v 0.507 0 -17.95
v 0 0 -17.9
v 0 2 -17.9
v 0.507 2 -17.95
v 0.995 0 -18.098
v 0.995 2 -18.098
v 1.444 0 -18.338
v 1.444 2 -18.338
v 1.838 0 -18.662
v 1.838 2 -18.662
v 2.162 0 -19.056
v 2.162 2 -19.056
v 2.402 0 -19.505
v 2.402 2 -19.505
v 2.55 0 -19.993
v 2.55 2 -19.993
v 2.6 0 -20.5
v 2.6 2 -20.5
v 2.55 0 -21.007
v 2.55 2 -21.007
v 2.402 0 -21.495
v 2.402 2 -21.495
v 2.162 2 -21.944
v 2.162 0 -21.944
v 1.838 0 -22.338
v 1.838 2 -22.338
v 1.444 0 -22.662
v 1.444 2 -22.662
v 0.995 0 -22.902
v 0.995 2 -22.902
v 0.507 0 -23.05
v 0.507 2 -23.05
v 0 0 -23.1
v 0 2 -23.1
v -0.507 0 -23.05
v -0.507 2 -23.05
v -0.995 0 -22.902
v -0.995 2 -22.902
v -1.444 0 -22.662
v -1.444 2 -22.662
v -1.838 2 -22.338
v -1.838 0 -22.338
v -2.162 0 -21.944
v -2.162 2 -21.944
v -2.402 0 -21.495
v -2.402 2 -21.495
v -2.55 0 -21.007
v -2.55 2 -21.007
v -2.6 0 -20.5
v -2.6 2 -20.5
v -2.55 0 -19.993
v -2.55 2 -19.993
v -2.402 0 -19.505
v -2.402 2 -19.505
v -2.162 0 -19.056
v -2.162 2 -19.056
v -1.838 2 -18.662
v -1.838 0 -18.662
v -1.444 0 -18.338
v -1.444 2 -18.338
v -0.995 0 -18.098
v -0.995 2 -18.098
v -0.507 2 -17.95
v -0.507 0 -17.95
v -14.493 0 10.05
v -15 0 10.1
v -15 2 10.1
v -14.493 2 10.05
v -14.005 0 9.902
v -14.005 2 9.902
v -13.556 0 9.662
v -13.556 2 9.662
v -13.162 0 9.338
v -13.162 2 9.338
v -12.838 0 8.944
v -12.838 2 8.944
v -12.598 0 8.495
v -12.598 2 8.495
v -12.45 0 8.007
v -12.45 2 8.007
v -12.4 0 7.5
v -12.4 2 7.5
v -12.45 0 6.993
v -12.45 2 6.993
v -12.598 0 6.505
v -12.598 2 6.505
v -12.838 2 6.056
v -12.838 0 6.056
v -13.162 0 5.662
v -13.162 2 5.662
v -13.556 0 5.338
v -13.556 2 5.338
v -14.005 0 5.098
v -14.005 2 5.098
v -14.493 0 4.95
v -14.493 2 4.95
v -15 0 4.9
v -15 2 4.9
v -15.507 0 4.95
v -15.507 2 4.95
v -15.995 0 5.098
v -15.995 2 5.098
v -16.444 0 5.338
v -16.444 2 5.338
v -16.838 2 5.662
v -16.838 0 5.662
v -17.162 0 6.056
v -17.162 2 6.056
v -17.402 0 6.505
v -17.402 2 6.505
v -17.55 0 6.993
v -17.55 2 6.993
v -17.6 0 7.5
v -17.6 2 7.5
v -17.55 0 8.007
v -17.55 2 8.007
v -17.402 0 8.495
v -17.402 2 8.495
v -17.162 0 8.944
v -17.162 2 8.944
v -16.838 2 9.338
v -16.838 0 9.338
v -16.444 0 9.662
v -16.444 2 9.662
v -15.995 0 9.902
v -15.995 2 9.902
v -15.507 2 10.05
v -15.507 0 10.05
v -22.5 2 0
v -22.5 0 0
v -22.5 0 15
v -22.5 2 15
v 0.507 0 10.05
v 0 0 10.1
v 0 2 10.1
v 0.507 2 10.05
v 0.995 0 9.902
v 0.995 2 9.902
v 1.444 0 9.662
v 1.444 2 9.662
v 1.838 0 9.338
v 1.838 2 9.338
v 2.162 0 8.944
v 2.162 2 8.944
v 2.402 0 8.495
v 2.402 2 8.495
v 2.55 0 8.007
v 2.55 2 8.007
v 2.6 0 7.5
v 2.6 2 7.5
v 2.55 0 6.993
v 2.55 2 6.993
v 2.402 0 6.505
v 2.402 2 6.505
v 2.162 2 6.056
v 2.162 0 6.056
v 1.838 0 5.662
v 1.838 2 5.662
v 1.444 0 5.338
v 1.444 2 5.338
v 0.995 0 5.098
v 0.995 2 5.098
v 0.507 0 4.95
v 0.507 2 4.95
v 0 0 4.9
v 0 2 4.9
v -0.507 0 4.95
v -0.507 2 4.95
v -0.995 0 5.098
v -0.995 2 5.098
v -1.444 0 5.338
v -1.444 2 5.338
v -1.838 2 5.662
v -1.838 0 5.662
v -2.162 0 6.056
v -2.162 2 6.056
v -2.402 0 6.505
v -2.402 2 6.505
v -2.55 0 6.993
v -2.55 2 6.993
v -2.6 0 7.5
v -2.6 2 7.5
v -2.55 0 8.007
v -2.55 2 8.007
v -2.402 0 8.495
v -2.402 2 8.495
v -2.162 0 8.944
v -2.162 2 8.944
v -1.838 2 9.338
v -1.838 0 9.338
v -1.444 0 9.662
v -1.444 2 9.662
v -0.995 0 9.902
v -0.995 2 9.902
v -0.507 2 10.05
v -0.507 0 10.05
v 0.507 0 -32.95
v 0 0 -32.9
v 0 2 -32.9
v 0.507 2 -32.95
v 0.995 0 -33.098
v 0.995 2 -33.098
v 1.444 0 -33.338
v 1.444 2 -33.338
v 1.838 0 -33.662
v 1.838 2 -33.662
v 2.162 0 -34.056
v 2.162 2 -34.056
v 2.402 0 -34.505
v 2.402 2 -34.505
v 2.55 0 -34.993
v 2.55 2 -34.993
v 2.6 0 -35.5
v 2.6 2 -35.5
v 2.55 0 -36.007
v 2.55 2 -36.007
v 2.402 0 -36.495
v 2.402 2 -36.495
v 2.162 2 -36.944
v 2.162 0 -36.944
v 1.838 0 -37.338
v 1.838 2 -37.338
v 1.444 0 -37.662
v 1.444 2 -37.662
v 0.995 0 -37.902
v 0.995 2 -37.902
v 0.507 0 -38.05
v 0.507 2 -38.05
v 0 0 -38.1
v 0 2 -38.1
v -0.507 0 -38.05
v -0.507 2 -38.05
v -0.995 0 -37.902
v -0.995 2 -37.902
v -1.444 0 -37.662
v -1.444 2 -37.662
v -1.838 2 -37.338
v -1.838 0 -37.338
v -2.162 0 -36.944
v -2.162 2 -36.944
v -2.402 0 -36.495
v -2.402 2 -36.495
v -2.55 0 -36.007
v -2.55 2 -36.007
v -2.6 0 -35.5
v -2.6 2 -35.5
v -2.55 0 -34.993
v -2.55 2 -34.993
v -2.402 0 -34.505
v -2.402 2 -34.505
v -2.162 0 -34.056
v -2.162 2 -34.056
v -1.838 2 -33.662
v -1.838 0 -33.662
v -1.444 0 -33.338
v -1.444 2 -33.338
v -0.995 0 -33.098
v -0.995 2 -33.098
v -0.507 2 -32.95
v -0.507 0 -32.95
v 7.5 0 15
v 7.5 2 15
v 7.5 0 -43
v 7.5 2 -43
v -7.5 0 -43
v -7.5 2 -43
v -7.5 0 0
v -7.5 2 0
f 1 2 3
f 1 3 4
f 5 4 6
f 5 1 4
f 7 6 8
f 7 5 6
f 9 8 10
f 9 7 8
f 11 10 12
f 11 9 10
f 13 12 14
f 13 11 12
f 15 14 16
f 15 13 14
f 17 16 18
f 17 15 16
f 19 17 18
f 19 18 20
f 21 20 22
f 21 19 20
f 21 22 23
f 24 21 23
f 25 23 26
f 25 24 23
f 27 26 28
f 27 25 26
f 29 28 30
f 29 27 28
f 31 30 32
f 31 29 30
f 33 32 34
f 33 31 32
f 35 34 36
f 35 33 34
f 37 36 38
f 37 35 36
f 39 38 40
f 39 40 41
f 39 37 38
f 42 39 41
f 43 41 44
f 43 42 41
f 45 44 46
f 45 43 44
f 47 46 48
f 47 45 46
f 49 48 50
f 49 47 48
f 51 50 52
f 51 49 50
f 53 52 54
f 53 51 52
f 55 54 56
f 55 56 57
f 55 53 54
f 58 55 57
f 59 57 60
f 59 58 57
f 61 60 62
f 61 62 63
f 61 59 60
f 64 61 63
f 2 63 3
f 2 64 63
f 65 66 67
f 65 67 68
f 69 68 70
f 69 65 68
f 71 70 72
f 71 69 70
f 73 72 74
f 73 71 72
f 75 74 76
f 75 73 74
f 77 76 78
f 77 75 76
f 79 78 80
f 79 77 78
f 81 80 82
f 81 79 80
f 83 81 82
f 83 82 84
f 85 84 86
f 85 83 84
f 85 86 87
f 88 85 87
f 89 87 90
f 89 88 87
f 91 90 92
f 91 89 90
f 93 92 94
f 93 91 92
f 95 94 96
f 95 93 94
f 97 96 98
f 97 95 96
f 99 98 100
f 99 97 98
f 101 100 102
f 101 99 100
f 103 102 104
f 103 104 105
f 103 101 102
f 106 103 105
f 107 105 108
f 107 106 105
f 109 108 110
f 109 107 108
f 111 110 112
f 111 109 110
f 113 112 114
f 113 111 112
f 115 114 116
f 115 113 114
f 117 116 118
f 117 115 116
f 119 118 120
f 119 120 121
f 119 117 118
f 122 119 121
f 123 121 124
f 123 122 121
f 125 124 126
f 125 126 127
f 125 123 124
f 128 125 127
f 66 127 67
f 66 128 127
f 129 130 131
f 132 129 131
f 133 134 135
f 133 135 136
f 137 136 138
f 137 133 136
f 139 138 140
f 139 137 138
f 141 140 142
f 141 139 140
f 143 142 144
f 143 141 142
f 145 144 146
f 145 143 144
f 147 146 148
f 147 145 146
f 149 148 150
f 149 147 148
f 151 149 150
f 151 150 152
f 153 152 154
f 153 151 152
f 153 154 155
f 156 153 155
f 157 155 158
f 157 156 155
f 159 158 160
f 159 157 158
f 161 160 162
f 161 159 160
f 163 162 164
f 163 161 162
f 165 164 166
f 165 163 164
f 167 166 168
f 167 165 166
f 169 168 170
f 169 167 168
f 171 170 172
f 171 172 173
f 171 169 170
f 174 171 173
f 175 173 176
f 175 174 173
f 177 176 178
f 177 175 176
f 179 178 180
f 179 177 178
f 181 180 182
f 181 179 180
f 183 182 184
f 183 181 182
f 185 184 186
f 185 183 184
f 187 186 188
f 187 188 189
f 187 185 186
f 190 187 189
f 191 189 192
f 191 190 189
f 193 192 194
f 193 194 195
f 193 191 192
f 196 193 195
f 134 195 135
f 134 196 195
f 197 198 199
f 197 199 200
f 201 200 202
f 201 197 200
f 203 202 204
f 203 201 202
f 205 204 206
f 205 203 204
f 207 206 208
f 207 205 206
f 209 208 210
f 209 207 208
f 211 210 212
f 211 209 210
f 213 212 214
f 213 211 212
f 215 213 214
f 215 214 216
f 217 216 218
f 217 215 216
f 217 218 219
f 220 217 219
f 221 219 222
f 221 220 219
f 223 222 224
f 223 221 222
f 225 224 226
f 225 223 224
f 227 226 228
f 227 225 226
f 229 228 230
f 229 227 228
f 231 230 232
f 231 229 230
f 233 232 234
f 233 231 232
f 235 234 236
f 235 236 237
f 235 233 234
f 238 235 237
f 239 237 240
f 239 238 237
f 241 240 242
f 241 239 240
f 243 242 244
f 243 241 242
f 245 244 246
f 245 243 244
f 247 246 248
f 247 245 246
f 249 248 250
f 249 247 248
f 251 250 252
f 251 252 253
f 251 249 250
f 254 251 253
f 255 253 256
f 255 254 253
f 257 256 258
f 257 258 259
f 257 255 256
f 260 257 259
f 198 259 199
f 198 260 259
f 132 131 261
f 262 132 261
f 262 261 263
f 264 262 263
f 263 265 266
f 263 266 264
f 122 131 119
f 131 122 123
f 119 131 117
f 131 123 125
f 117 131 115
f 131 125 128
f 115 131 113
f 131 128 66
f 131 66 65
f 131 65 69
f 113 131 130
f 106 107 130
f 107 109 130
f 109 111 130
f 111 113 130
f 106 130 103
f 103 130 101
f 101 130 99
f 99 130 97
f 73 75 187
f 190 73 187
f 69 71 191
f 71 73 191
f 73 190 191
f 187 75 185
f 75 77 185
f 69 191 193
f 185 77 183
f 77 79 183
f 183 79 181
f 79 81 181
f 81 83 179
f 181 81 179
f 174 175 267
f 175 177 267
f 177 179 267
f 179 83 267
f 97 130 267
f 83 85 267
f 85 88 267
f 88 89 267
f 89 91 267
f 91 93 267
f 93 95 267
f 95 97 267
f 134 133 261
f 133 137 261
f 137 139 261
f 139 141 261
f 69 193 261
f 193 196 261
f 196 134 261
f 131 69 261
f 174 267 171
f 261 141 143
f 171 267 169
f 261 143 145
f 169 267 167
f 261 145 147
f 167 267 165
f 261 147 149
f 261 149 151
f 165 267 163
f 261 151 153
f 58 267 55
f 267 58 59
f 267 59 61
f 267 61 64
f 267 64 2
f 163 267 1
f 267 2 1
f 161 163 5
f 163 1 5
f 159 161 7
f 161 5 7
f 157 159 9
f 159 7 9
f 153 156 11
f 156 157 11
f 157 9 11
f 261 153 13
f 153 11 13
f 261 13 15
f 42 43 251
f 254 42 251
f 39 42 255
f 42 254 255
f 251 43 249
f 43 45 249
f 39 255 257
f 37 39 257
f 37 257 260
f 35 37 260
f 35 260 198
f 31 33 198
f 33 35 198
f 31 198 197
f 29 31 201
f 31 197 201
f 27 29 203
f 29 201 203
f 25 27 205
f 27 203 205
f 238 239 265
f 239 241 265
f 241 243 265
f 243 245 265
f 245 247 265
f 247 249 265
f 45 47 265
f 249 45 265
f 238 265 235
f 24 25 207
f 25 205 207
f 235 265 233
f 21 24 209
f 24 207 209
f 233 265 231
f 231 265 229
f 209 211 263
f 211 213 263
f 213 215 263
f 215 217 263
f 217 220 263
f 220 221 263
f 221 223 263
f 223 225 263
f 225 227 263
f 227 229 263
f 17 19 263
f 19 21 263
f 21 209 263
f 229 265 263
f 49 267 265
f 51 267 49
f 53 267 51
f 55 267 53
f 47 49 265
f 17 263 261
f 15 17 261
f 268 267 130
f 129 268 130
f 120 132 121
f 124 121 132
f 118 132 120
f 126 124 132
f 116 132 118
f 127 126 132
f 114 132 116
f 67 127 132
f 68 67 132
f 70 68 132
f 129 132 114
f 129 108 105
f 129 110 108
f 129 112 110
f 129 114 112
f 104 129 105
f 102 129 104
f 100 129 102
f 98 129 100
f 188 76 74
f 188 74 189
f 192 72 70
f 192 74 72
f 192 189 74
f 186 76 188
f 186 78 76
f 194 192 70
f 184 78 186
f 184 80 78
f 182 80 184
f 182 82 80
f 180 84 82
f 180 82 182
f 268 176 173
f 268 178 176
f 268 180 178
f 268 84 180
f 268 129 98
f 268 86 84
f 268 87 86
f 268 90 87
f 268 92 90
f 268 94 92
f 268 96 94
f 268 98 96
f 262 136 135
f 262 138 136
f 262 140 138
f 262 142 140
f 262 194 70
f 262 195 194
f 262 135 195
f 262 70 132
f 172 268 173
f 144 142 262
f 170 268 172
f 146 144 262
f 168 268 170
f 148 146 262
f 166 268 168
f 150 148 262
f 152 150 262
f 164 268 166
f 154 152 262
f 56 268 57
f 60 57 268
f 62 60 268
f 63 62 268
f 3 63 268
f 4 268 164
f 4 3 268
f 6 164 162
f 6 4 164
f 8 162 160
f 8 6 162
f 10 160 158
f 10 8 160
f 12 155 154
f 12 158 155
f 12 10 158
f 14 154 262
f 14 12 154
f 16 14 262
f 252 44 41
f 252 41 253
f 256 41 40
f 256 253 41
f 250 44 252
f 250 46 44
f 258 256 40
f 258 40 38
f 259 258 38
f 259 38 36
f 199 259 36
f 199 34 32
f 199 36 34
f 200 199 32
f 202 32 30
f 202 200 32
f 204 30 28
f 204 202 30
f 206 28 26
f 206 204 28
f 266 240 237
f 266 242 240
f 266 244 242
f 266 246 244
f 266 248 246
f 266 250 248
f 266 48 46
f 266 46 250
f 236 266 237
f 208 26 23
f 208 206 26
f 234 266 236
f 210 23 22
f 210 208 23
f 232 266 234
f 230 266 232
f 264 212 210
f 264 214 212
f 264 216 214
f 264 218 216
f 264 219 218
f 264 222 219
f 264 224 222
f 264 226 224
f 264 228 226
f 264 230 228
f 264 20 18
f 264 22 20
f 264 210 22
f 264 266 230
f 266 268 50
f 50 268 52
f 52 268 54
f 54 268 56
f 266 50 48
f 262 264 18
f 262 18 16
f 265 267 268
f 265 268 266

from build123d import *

# Parameters (mm, degrees)
SKETCH_1_R      = 2.6
SKETCH_1_W      = 15
SKETCH_1_H      = 15
EXTRUDE_1_DEPTH = 2


with BuildPart() as part:
    # 草图1 → 凸台-拉伸1 (new body)
    # profile 1 of 2: a face of its own
    with BuildSketch(Plane(origin=(0, 0, 0), x_dir=(1, 0, 0), z_dir=(0, 1, 0))):
        Polygon((7.5, -15), (7.5, 0), (7.5, 13), (7.5, 28), (-7.5, 28), (-7.5, 13), (-7.5, 0), (-22.5, 0), (-22.5, -15), align=None)
        with Locations(Location((-15, -7.5, 0), (0, 0, 270))):
            Circle(SKETCH_1_R, mode=Mode.SUBTRACT)
        with Locations(Location((0, -7.5, 0), (0, 0, 270))):
            Circle(SKETCH_1_R, mode=Mode.SUBTRACT)
        with Locations(Location((0, 20.5, 0), (0, 0, 270))):
            Circle(SKETCH_1_R, mode=Mode.SUBTRACT)
    # profile 2 of 2: a face of its own
    with BuildSketch(Plane(origin=(0, 0, 0), x_dir=(1, 0, 0), z_dir=(0, 1, 0))):
        with Locations((0, 35.5)):
            Rectangle(SKETCH_1_W, SKETCH_1_H)
        with Locations(Location((0, 35.5, 0), (0, 0, 270))):
            Circle(SKETCH_1_R, mode=Mode.SUBTRACT)
    extrude(amount=EXTRUDE_1_DEPTH)


solid = part.part
